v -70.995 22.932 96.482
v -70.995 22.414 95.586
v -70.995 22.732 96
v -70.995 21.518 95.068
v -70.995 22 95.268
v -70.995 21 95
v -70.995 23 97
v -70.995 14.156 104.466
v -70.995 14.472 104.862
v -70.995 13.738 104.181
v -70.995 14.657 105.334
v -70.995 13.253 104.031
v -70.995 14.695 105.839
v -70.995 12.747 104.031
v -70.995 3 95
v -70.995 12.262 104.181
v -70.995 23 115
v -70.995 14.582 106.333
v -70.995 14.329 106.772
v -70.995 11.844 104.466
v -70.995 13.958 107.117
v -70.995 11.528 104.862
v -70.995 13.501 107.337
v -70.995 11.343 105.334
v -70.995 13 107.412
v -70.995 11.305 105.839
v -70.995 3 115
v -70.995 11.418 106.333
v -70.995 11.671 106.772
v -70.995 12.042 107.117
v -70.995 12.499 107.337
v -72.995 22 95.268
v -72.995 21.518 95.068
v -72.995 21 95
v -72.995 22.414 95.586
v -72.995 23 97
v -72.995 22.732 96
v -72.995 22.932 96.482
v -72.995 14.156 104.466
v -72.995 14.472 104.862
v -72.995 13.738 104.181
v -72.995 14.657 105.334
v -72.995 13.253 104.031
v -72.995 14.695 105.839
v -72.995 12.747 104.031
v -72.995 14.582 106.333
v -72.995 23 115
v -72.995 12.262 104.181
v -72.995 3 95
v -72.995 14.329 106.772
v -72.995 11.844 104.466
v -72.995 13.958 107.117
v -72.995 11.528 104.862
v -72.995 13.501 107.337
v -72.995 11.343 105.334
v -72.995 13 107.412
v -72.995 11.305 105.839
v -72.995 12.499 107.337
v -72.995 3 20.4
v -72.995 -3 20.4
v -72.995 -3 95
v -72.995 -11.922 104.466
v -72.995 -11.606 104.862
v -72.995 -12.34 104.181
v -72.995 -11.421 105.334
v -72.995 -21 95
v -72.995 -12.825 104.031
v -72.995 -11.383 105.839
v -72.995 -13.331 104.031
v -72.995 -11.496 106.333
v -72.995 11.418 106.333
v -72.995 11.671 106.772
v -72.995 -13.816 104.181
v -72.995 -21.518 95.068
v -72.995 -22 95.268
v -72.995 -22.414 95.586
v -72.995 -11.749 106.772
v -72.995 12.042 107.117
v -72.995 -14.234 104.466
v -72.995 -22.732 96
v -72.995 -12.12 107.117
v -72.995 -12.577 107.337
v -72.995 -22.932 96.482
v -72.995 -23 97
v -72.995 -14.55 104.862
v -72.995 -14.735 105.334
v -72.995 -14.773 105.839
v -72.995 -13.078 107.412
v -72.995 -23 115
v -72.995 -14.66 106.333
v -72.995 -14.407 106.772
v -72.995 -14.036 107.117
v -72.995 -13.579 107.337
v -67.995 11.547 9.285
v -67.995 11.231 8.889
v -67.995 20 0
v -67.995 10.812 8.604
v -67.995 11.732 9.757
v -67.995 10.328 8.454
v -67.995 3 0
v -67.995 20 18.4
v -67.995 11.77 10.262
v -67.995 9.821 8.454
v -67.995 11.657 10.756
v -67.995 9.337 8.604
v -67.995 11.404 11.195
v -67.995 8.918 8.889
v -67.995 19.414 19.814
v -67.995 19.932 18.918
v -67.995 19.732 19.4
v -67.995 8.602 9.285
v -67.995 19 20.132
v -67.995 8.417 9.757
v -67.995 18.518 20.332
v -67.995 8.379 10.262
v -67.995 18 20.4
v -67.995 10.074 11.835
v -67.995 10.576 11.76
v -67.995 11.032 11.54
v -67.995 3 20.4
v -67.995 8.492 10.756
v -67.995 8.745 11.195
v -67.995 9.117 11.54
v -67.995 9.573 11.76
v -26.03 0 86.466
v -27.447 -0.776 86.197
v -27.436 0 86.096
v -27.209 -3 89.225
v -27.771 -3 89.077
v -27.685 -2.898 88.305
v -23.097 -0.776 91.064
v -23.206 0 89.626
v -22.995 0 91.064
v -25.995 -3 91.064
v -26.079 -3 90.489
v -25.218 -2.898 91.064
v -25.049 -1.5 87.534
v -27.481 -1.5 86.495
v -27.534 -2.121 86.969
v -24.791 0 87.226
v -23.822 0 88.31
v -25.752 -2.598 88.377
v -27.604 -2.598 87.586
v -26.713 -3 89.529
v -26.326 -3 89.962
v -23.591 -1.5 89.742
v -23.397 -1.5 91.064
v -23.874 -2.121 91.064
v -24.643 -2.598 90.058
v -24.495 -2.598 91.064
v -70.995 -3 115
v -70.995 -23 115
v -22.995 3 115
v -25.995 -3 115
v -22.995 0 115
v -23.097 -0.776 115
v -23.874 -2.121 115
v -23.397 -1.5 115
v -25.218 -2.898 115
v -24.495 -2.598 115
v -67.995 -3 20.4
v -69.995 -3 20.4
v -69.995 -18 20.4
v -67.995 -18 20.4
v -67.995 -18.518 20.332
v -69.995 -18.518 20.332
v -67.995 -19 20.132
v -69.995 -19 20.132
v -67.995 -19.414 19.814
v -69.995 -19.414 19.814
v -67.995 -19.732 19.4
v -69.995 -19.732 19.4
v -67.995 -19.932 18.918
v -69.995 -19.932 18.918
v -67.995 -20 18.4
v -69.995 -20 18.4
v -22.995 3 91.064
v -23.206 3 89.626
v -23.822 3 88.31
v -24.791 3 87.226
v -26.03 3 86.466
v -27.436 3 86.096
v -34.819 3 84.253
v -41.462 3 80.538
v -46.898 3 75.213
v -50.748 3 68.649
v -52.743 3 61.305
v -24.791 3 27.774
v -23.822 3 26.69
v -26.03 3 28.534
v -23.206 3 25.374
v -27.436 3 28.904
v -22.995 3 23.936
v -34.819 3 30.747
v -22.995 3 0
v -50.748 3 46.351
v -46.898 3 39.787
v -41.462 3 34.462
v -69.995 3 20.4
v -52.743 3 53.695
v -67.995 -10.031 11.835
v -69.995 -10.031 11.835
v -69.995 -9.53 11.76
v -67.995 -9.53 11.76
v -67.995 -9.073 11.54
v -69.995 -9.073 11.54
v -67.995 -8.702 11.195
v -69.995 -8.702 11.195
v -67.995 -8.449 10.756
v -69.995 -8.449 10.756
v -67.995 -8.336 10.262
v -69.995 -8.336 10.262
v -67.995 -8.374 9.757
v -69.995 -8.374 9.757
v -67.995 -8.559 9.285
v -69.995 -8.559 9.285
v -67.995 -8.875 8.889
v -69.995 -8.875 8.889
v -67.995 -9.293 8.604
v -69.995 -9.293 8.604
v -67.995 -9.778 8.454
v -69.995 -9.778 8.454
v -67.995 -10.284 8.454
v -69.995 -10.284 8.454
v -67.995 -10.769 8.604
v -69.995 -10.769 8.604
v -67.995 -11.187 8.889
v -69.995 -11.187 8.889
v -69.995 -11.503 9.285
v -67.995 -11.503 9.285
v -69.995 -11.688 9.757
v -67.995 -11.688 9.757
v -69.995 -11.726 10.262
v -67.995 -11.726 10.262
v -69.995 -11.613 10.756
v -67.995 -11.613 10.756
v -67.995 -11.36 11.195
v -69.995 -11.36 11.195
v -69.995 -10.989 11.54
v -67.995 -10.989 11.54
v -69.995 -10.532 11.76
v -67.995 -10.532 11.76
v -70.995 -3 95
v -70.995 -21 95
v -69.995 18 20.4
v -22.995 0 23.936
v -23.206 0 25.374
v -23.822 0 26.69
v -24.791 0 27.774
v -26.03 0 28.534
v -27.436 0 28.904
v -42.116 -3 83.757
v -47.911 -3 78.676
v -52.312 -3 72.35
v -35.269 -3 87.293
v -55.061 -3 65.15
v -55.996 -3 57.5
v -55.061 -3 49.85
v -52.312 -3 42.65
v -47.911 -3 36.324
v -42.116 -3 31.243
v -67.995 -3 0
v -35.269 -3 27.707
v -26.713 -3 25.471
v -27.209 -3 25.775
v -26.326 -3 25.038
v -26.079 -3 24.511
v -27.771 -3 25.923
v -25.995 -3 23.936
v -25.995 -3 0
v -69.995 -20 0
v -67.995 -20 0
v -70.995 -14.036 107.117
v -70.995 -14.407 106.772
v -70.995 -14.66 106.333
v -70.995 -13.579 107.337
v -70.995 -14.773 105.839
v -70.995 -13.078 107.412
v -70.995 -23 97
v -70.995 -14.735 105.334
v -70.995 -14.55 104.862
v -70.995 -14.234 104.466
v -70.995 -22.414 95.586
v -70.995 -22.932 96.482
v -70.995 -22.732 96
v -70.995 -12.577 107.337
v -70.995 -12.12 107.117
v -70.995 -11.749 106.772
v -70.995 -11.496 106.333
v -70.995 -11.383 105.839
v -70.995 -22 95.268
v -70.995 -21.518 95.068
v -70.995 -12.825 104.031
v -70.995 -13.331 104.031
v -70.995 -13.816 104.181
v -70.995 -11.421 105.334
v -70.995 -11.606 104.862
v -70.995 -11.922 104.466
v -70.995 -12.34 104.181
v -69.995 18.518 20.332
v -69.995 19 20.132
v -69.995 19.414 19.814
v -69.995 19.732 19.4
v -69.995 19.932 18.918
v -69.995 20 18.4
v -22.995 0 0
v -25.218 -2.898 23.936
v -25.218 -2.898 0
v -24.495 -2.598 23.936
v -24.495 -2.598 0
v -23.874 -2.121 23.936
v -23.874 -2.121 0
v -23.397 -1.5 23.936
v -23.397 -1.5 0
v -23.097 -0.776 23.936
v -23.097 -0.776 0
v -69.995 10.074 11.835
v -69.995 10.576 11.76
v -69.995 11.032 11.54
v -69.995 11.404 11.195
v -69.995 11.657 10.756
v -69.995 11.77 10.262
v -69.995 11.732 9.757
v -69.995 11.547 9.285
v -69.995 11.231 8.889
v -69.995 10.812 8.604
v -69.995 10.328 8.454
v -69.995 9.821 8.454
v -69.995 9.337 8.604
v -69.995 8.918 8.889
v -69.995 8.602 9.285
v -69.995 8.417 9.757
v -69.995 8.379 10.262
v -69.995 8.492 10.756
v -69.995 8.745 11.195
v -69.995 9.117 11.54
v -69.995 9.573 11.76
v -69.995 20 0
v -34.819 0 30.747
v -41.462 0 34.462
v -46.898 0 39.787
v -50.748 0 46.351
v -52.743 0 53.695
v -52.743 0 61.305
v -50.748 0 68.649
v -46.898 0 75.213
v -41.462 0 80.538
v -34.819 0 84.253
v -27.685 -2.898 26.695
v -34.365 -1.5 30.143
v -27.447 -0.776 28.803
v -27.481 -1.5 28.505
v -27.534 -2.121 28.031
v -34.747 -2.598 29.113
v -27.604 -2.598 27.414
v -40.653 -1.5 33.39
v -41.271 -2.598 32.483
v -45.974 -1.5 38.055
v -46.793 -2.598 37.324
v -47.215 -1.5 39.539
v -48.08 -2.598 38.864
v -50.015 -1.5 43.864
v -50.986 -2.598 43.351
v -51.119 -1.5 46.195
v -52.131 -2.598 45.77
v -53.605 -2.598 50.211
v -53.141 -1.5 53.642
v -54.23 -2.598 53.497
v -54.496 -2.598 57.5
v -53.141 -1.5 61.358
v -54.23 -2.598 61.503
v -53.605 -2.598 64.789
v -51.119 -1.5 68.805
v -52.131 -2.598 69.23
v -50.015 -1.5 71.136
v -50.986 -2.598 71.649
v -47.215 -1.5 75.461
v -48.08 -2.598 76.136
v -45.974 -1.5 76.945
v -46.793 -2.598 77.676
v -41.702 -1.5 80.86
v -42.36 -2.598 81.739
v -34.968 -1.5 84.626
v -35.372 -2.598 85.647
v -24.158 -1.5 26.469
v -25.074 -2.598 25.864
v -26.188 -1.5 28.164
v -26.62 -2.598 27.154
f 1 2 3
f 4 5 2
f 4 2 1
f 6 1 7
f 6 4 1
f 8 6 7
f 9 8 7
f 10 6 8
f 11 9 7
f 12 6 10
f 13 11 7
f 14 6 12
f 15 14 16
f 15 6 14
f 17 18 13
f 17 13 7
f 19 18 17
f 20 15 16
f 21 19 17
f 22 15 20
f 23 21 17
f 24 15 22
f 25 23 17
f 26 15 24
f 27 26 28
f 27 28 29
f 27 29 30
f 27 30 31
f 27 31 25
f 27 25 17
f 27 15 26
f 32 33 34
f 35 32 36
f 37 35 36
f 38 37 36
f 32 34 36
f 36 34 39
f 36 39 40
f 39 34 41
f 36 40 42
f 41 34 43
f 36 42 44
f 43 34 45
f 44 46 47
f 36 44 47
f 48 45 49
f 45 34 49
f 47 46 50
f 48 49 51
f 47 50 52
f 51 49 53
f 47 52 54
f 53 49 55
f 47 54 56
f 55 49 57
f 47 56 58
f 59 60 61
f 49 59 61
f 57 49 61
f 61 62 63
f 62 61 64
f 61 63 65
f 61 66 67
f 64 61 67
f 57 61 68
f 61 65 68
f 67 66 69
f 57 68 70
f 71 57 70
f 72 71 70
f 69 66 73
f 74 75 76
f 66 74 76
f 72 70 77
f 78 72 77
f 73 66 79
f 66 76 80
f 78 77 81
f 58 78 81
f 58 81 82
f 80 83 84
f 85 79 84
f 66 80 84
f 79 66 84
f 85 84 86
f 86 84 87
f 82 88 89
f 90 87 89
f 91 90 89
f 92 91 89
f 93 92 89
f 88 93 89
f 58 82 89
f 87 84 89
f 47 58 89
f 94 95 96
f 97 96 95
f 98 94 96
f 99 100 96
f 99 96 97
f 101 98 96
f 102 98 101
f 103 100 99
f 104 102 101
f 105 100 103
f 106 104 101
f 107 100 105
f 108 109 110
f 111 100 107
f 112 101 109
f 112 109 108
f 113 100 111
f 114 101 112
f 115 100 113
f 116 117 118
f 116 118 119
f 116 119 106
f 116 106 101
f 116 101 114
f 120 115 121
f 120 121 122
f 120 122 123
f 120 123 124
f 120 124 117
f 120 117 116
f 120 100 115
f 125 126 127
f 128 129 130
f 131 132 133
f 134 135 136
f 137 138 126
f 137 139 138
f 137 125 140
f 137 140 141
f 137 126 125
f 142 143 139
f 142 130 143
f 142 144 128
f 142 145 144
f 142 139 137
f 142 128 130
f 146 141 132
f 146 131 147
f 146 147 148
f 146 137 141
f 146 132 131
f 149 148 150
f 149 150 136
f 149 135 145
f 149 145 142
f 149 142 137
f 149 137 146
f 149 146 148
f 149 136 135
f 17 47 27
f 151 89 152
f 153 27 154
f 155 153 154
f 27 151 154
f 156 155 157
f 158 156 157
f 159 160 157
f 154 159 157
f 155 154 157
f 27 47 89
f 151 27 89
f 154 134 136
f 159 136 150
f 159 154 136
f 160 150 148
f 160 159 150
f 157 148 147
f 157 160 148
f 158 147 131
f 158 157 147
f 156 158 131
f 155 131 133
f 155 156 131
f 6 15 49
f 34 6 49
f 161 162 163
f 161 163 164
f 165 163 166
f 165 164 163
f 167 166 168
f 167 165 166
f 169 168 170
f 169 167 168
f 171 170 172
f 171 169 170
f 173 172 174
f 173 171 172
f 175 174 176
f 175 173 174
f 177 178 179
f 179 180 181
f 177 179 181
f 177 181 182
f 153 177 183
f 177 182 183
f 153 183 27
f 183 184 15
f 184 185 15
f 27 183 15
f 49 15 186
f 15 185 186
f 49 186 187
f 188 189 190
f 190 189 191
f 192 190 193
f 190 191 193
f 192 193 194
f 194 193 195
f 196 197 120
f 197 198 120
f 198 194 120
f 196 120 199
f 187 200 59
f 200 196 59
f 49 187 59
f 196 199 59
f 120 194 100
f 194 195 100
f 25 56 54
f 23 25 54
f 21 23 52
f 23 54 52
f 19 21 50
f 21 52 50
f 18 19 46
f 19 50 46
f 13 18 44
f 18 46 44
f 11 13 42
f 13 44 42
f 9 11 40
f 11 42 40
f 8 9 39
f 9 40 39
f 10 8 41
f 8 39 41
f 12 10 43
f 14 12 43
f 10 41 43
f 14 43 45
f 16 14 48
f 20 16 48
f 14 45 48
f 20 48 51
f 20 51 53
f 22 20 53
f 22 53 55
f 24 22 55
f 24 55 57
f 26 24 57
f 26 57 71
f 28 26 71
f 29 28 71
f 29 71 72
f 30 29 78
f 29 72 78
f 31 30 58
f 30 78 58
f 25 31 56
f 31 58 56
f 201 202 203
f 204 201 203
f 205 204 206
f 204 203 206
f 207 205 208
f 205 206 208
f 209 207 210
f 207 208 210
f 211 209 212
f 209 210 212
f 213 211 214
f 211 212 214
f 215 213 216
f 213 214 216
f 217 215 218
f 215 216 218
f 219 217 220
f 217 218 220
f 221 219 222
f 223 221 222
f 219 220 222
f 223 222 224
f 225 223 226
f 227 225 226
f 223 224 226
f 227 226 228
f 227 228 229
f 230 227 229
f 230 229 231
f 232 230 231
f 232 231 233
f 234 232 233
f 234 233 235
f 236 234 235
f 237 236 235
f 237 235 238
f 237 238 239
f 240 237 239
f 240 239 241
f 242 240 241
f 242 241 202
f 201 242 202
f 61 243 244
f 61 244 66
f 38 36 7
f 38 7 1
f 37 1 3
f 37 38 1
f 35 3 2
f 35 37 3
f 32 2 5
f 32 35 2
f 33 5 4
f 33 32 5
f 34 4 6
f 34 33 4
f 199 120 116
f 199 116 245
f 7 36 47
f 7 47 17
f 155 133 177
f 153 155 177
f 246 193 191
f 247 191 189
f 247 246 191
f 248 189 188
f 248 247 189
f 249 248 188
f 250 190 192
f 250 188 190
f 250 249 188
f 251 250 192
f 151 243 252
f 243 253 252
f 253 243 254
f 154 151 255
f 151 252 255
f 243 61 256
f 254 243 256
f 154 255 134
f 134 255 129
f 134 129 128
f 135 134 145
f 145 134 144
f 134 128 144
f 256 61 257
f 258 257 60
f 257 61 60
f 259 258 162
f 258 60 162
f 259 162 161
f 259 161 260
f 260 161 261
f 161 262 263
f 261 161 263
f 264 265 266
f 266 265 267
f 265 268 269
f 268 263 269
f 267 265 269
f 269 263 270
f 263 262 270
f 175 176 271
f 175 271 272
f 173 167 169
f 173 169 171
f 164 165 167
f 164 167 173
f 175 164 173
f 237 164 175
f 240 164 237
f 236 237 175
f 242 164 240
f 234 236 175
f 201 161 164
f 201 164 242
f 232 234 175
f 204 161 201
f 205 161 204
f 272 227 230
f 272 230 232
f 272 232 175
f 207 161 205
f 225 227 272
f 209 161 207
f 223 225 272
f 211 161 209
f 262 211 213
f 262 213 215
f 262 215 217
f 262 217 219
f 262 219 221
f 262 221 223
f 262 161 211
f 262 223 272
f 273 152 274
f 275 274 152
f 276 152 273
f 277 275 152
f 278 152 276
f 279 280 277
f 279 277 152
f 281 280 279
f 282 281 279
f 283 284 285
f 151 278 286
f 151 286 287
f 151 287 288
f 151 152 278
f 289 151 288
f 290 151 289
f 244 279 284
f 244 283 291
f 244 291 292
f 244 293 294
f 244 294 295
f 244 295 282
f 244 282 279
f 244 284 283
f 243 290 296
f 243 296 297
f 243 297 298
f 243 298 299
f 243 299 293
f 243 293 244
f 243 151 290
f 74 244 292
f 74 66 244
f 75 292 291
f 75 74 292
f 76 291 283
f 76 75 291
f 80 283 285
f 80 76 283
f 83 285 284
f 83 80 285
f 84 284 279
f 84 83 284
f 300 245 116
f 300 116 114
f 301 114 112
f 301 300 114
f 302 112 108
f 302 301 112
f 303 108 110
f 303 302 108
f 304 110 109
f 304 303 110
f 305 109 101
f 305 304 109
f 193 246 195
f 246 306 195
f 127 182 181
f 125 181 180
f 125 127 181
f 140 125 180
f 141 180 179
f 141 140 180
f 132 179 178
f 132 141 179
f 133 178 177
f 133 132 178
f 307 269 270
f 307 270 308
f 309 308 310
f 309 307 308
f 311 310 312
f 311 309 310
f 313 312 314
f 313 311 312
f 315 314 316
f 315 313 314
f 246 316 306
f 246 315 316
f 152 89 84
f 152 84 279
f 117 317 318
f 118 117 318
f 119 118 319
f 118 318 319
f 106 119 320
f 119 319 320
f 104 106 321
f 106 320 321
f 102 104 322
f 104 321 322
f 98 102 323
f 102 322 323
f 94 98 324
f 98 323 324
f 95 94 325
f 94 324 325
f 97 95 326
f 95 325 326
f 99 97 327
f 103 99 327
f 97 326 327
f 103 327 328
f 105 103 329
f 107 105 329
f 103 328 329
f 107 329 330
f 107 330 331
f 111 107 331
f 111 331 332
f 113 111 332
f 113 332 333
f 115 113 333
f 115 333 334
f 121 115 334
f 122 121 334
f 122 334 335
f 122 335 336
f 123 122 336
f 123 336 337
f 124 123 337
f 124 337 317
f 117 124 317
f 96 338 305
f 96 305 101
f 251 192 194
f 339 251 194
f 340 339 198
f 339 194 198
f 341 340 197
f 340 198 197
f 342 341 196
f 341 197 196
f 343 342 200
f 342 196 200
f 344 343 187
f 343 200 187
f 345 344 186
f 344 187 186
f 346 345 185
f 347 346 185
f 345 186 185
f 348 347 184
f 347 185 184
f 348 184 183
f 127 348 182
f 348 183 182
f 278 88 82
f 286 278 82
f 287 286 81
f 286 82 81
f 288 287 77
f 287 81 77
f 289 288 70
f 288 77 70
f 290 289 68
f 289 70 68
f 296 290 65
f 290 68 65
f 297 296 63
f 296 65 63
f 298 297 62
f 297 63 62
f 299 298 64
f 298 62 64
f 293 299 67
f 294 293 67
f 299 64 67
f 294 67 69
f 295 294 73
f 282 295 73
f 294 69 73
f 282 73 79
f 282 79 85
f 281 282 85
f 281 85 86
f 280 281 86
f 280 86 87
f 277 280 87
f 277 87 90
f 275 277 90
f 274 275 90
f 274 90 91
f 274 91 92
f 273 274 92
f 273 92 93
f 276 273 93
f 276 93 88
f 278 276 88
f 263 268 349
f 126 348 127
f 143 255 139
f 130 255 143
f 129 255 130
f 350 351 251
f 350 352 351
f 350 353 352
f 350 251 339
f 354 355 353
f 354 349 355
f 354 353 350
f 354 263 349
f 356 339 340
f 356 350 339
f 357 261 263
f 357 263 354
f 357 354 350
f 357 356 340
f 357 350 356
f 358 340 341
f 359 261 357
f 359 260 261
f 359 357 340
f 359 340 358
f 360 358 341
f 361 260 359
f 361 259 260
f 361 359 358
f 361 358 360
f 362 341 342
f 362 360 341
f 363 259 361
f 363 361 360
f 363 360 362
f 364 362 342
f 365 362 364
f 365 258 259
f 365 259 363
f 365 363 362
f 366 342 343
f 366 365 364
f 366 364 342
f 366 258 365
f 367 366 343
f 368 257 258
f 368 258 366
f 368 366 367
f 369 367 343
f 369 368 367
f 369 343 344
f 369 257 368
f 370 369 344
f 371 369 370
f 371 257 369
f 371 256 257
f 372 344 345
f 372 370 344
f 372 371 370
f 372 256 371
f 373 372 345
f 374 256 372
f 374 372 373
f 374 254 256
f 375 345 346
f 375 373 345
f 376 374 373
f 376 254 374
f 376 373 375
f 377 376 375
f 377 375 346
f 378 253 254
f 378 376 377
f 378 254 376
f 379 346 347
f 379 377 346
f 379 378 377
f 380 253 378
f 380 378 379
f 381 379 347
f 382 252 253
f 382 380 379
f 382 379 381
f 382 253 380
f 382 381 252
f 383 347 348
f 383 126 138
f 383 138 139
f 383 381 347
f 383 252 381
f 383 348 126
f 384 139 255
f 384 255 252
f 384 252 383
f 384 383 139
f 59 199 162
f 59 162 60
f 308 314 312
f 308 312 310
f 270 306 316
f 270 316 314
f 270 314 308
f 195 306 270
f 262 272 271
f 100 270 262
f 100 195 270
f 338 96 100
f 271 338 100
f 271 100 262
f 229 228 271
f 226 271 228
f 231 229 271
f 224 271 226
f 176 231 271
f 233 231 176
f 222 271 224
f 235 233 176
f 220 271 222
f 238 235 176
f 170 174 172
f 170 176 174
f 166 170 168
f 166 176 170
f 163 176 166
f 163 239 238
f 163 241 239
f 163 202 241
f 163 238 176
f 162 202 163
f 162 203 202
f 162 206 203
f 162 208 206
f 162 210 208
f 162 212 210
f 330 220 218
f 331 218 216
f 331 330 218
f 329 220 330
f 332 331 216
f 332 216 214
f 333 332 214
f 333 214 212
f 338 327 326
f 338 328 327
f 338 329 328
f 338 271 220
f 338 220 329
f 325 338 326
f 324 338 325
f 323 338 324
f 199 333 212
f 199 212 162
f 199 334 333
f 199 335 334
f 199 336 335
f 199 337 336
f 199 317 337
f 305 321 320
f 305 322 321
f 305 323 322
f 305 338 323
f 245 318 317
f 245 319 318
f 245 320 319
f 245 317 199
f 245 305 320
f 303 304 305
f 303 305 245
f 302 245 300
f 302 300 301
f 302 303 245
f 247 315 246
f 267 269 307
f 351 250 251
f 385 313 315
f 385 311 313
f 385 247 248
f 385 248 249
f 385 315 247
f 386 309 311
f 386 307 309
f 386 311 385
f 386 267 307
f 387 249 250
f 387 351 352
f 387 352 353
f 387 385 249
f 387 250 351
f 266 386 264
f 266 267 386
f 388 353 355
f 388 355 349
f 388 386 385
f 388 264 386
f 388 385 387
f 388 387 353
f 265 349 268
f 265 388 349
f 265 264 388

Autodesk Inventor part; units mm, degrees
ref_plane "YZ Plane" through (0, 0, 0) normal (1, 0, 0) x (0, 1, 0)
ref_plane "XZ Plane" through (0, 0, 0) normal (0, 1, 0) x (-1, 0, 0)
ref_plane "XY Plane" through (0, 0, 0) normal (0, 0, 1) x (1, 0, 0)
ref_plane "Plano de trabajo1" through (0, 0, 0) normal (0, 0, 1) x (1, 0, 0)
sketch "Boceto1" plane through (0, 0, 0) normal (0, 0, 1) x (1, 0, 0)
  line L0 (-72.9949, 0) -> (-72.9949, 3)
  line L1 (-72.9949, 3) -> (-72.9949, -3)
  line L2 (-72.9949, -3) -> (-22.9949, -3)
  line L3 (-22.9949, -3) -> (-22.9949, 3)
  line L4 (-22.9949, 3) -> (-72.9949, 3)
  point P0 (0, 0)
  dimension "d0" = 3
  dimension "d1" = 6
  dimension "d2" = 50
  dimension "d3" = 90
  dimension "d4" = 6
extrude "Extrusión1" add sketch "Boceto1" along normal blind 115
sketch "Boceto2" plane through (-72.9949, 3, 0) normal (0, 1, 0) x (1, 0, 0)
  line L0 (0, 0) -> (0, -115) projected
  line L1 (0, 0) -> (3, 0)
  line L2 (3, 0) -> (3, -20.4)
  line L3 (3, -20.4) -> (0, -20.4)
  line L4 (0, -20.4) -> (0, 0)
  point P0 (72.9949, 0)
  dimension "d7" = 3
  dimension "d8" = 20.4
extrude "Extrusión2" cut sketch "Boceto2" against normal blind 6
sketch "Boceto3" plane through (-72.9949, 3, 115) normal (0, 1, 0) x (1, 0, 0)
  line L0 (3, 115) -> (50, 115) projected
  line L1 (3, 115) -> (5, 115)
  line L2 (5, 115) -> (5, 94.6)
  line L3 (5, 94.6) -> (3, 94.6)
  line L4 (3, 94.6) -> (3, 115)
  point P0 (72.9949, 115)
  dimension "d11" = 2
  dimension "d12" = 20.4
extrude "Extrusión3" add sketch "Boceto3" along normal blind 17
sketch "Boceto5" plane through (-72.9949, -3, 115) normal (0, -1, 0) x (1, 0, 0)
  line L0 (3, -94.6) -> (0, -94.6) projected
  line L1 (3, -94.6) -> (5, -94.6)
  line L2 (5, -94.6) -> (5, -115)
  line L3 (5, -115) -> (3, -115)
  line L4 (3, -115) -> (3, -94.6)
  point P0 (72.9949, -115)
  dimension "d15" = 2
  dimension "d16" = 20.4
extrude "Extrusión4" add sketch "Boceto5" along normal blind 17
fillet "Empalme1" radius 2 2 edges at (-68.9949, -20, 20.4) (-68.9949, 20, 20.4)
sketch "Boceto6" plane through (-69.9949, -20, 0) normal (-1, 0, 0) x (0, 0, 1)
  circle A0 centre (10.1353, 9.969) radius 1.7
  circle A1 centre (10.1353, 30.0745) radius 1.7
  point P0 (0, 20)
  dimension "d20" = 3.4
  dimension "d21" = 3.4
extrude "Extrusión5" cut sketch "Boceto6" against normal blind 2
sketch "Boceto7" plane through (-72.9949, -3, 115) normal (0, -1, 0) x (1, 0, 0)
  line L0 (0, 0) -> (2, 0)
  line L1 (2, 0) -> (2, -20)
  line L2 (2, -20) -> (0, -20)
  line L3 (0, -20) -> (0, 0)
  point P0 (72.9949, -115)
  dimension "d24" = 2
  dimension "d25" = 20
extrude "Extrusión6" add sketch "Boceto7" along normal blind 20
sketch "Boceto8" plane through (-72.9949, 3, 115) normal (0, 1, 0) x (1, 0, 0)
  line L0 (2, 20) -> (2, 0) projected
  line L1 (0, 0) -> (2, 0)
  line L2 (2, 0) -> (2, 20)
  line L3 (2, 20) -> (0, 20)
  line L4 (0, 20) -> (0, 0)
  point P0 (72.9949, 115)
  dimension "d28" = 2
  dimension "d29" = 20
extrude "Extrusión7" add sketch "Boceto8" along normal blind 20
sketch "Boceto9" plane through (-72.9949, -3, 20.4) normal (-1, 0, 0) x (0, 0, 1)
  circle A0 centre (85.3122, 16) radius 1.7
  circle A1 centre (85.3122, -10.078) radius 1.7
  point P0 (-20.4, 3)
  dimension "d32" = 3.4
  dimension "d33" = 3.4
extrude "Extrusión8" cut sketch "Boceto9" against normal blind 20
fillet "Empalme2" radius 2 2 edges at (-71.9949, 23, 95) (-71.9949, -23, 95)
sketch "Boceto10" plane through (-22.9949, 3, 115) normal (0, 1, 0) x (1, 0, 0)
  line L0 (0, 115) -> (0, 0) projected
  line L1 (0, 115) -> (0, 57.5)
  line L2 (0, 57.5) -> (0, 86.25)
  line L3 (0, 57.5) -> (28.75, 57.5) construction
  line L4 (0, 86.25) -> (0, 28.75)
  line L5 (-50, 94.6) -> (-50, 20) projected
  line L6 (-50, 57.3) -> (-30, 57.3)
  line L7 (-50, 57.3) -> (-30, 57.3) construction
  line L8 (0, 86.25) -> (0, 28.75)
  arc A0 (0, 86.25) -> (0, 28.75) centre (-1.2246, 57.5) ccw
  point P0 (22.9949, 115)
  dimension "d37" = 57.5
  dimension "d39" = 28.75
  dimension "d40" = 90
  dimension "d41" = 57.5
  dimension "d42" = 0
  dimension "d43" = 20
  dimension "d44" = 0
extrude "Extrusión9" cut sketch "Boceto10" against normal blind 20
fillet "Empalme3" radius 5 2 edges at (-22.9949, 0, 86.25) (-22.9949, 0, 28.75)
fillet "Empalme4" radius 3 5 edges at (-22.9949, -3, 11.9678) (-24.267, -3, 87.7323) (-24.267, -3, 27.2677) (-52.9955, -3, 57.5) (-22.9949, -3, 103.0322)
properties part number "SoporteAmbu"
